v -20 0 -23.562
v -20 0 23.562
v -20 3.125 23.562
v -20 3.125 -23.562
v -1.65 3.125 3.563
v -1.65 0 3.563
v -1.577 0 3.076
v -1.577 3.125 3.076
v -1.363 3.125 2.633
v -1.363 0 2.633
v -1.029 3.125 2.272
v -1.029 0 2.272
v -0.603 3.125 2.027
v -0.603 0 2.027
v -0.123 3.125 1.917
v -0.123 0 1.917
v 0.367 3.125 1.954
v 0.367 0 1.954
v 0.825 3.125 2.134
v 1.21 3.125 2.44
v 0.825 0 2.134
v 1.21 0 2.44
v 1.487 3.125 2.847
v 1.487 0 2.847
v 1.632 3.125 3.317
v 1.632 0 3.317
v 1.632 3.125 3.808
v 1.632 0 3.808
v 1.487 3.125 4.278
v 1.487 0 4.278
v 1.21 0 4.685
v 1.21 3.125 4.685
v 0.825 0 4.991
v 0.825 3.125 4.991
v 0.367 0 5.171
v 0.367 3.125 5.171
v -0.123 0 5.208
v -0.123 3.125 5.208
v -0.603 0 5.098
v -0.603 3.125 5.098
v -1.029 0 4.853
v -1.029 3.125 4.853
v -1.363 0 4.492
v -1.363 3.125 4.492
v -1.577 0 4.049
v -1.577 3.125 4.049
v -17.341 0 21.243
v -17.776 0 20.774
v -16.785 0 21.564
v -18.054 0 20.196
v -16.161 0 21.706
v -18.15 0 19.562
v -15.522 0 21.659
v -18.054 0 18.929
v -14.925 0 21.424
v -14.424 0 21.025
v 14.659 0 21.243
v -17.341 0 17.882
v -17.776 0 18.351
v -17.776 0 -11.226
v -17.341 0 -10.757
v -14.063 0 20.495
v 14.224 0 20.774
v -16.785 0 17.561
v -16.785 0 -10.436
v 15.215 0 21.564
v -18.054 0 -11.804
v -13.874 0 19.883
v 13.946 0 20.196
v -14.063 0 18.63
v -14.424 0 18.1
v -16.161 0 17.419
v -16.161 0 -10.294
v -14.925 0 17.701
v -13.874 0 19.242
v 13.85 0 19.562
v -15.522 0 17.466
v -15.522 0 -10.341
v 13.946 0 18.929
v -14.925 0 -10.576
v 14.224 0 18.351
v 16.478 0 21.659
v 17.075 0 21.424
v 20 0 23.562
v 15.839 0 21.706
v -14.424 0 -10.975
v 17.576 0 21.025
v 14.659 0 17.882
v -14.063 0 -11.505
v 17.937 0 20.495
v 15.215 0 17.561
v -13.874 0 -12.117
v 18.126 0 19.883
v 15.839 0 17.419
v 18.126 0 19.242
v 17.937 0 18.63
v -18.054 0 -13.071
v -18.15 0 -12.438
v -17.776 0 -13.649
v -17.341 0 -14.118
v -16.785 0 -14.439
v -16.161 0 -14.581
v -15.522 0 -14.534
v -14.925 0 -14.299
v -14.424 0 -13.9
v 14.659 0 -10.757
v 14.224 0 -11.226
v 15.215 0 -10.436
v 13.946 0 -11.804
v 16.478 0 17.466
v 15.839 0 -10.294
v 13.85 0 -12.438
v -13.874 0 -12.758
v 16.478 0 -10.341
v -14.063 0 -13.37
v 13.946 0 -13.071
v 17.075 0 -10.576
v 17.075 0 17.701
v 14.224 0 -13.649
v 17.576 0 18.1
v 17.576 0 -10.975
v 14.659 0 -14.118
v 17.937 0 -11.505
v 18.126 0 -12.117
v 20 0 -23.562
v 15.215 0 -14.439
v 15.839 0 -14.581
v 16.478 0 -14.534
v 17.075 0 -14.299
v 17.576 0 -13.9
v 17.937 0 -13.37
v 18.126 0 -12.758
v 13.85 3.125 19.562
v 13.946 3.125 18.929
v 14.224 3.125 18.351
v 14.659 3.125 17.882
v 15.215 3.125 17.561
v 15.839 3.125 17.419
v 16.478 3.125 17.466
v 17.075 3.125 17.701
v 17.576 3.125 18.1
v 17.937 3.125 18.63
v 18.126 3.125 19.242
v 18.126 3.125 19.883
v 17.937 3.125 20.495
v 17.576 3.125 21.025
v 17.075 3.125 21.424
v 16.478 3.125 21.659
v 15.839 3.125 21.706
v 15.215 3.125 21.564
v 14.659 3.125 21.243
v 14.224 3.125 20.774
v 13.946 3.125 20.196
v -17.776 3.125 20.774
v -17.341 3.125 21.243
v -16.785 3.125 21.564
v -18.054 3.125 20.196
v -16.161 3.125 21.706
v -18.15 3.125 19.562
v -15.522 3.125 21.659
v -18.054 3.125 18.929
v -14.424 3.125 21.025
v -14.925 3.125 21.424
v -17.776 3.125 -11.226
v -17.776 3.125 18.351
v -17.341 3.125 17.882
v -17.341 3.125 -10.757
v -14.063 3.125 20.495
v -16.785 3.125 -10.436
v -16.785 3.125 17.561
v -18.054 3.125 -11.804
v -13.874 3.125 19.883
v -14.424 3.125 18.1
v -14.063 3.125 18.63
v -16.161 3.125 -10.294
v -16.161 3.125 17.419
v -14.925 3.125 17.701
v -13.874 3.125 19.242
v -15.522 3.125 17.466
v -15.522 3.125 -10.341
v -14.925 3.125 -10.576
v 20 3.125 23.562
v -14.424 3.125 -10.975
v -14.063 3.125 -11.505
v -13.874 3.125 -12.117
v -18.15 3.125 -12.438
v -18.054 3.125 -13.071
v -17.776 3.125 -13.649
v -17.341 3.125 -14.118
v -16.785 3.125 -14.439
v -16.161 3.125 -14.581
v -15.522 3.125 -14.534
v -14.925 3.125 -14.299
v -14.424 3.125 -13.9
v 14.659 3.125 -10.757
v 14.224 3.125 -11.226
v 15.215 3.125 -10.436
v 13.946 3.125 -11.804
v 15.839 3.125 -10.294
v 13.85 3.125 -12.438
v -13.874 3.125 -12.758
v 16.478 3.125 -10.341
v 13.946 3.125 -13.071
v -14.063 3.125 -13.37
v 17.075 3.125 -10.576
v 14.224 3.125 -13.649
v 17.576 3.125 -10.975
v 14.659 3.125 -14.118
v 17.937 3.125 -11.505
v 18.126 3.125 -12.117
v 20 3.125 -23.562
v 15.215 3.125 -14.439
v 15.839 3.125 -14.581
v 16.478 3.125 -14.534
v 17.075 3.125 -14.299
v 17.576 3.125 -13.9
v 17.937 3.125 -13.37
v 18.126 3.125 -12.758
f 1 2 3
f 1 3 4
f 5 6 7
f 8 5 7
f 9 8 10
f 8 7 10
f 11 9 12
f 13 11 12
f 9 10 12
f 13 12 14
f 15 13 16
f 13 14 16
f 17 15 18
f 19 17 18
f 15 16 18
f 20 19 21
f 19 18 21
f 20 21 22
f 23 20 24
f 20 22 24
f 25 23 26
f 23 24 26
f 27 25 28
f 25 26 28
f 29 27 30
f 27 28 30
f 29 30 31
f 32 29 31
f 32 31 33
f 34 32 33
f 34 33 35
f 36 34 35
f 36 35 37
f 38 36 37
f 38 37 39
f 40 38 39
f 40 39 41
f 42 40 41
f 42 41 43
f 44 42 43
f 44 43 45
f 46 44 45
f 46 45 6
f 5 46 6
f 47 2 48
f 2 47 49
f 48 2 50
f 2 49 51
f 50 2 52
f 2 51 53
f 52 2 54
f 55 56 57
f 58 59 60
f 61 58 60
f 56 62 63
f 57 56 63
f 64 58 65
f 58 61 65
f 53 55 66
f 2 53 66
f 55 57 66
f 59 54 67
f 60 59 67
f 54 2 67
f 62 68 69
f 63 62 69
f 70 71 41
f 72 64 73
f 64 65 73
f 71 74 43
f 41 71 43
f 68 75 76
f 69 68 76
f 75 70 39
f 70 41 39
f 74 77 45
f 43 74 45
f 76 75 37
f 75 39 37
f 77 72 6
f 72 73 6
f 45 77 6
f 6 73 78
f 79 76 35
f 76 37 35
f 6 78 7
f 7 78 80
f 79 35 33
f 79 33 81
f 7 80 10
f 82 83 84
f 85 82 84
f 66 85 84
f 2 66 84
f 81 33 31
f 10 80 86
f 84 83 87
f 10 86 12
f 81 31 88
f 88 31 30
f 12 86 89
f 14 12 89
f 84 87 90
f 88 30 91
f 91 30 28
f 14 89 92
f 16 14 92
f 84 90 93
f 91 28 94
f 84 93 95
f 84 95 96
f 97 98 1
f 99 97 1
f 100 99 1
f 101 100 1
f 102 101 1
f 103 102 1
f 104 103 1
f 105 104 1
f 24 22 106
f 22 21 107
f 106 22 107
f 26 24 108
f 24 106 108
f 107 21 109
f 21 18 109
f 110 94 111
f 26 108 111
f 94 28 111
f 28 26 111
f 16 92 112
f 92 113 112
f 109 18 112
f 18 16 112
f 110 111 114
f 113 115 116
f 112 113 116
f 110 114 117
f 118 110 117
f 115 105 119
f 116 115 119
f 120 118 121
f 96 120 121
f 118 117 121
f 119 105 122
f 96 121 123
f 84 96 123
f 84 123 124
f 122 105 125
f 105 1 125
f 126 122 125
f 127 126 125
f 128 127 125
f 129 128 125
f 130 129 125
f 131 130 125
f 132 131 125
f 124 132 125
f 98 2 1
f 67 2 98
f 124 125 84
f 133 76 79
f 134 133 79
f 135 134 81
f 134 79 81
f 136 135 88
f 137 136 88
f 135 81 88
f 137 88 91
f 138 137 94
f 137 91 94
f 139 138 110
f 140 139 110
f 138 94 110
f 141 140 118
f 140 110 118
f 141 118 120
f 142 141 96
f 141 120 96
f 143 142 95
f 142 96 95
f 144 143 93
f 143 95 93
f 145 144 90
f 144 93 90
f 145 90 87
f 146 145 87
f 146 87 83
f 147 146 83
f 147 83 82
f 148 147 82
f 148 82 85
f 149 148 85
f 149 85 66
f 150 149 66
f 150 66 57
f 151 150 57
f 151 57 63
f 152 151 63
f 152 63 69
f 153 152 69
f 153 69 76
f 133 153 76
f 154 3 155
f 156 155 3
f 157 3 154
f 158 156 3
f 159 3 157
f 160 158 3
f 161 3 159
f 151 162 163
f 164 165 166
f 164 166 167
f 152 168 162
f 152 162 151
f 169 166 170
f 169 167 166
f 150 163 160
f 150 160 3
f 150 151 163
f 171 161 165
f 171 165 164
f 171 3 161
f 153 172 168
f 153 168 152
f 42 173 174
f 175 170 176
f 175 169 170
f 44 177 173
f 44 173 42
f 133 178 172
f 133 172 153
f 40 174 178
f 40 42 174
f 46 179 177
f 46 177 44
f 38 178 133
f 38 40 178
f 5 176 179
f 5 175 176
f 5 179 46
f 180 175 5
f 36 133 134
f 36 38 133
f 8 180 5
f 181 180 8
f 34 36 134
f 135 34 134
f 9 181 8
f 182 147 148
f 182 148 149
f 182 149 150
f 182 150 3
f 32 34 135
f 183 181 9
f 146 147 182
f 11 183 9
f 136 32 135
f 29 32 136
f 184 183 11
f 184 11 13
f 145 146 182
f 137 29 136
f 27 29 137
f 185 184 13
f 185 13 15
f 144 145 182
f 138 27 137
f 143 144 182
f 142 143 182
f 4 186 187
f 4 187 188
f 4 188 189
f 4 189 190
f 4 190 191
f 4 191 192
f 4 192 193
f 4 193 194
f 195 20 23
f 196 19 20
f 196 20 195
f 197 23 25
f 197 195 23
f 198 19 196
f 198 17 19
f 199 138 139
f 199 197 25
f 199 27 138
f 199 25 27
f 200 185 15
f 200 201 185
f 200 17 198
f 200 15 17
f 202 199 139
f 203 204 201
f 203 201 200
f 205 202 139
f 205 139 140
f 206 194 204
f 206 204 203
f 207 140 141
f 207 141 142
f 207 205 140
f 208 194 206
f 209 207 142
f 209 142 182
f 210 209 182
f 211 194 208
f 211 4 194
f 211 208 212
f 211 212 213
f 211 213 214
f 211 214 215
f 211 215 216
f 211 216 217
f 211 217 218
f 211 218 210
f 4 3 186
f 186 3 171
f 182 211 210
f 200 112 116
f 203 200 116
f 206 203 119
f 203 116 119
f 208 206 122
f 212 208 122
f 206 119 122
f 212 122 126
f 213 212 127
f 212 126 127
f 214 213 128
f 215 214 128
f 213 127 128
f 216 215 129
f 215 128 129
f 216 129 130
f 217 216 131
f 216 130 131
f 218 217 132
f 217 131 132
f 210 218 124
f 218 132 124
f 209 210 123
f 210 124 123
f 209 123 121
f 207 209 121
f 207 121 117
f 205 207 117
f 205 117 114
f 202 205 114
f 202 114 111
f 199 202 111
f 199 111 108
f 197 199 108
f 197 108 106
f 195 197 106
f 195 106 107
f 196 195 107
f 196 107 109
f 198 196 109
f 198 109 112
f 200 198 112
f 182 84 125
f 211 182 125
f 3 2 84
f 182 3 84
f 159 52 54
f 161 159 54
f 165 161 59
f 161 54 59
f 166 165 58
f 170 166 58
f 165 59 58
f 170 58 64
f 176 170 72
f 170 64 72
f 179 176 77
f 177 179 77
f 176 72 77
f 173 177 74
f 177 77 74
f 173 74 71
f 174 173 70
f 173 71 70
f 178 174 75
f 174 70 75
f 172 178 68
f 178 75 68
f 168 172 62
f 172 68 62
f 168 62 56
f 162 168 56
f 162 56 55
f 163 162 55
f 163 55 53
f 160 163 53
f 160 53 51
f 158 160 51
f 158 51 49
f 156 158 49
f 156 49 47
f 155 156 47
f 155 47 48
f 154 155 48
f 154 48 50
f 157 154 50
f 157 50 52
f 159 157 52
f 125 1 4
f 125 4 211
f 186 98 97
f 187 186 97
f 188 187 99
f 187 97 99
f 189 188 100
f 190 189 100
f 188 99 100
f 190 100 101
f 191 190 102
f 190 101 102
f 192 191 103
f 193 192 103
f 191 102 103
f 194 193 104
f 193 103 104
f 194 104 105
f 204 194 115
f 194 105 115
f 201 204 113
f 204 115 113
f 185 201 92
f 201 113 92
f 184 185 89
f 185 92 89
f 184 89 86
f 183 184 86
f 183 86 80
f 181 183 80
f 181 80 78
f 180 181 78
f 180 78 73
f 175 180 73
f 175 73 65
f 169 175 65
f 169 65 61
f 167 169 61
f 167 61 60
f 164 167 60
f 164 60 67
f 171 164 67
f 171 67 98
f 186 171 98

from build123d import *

# Parameters (mm, degrees)
SKETCH1_W             = 40
SKETCH1_H             = 47.125
BOSS_EXTRUDE1_DEPTH   = 3.125
M4_CLEARANCE_HOLE1_D  = 4.3
M4X0_7_TAPPED_HOLE1_D = 3.3


with BuildPart() as part:
    # Sketch1 → Boss-Extrude1 (new body)
    with BuildSketch(Plane(origin=(0, 0, 0), x_dir=(1, 0, 0), z_dir=(0, 1, 0))):
        Rectangle(SKETCH1_W, SKETCH1_H)
    extrude(amount=BOSS_EXTRUDE1_DEPTH)

    # M4 Clearance Hole1 (through all)
    with Locations(Plane(origin=(0, 3.125, 0), x_dir=(1, 0, 0), z_dir=(0, 1, 0))):
        with Locations((16, -19.5625), (-16, -19.5625), (-16, 12.4375), (16, 12.4375)):
            Hole(M4_CLEARANCE_HOLE1_D / 2)

    # M4x0.7 Tapped Hole1 (through all)
    with Locations(Plane(origin=(0, 3.125, 0), x_dir=(1, 0, 0), z_dir=(0, 1, 0))):
        with Locations((0, -3.5625)):
            Hole(M4X0_7_TAPPED_HOLE1_D / 2)


solid = part.part
